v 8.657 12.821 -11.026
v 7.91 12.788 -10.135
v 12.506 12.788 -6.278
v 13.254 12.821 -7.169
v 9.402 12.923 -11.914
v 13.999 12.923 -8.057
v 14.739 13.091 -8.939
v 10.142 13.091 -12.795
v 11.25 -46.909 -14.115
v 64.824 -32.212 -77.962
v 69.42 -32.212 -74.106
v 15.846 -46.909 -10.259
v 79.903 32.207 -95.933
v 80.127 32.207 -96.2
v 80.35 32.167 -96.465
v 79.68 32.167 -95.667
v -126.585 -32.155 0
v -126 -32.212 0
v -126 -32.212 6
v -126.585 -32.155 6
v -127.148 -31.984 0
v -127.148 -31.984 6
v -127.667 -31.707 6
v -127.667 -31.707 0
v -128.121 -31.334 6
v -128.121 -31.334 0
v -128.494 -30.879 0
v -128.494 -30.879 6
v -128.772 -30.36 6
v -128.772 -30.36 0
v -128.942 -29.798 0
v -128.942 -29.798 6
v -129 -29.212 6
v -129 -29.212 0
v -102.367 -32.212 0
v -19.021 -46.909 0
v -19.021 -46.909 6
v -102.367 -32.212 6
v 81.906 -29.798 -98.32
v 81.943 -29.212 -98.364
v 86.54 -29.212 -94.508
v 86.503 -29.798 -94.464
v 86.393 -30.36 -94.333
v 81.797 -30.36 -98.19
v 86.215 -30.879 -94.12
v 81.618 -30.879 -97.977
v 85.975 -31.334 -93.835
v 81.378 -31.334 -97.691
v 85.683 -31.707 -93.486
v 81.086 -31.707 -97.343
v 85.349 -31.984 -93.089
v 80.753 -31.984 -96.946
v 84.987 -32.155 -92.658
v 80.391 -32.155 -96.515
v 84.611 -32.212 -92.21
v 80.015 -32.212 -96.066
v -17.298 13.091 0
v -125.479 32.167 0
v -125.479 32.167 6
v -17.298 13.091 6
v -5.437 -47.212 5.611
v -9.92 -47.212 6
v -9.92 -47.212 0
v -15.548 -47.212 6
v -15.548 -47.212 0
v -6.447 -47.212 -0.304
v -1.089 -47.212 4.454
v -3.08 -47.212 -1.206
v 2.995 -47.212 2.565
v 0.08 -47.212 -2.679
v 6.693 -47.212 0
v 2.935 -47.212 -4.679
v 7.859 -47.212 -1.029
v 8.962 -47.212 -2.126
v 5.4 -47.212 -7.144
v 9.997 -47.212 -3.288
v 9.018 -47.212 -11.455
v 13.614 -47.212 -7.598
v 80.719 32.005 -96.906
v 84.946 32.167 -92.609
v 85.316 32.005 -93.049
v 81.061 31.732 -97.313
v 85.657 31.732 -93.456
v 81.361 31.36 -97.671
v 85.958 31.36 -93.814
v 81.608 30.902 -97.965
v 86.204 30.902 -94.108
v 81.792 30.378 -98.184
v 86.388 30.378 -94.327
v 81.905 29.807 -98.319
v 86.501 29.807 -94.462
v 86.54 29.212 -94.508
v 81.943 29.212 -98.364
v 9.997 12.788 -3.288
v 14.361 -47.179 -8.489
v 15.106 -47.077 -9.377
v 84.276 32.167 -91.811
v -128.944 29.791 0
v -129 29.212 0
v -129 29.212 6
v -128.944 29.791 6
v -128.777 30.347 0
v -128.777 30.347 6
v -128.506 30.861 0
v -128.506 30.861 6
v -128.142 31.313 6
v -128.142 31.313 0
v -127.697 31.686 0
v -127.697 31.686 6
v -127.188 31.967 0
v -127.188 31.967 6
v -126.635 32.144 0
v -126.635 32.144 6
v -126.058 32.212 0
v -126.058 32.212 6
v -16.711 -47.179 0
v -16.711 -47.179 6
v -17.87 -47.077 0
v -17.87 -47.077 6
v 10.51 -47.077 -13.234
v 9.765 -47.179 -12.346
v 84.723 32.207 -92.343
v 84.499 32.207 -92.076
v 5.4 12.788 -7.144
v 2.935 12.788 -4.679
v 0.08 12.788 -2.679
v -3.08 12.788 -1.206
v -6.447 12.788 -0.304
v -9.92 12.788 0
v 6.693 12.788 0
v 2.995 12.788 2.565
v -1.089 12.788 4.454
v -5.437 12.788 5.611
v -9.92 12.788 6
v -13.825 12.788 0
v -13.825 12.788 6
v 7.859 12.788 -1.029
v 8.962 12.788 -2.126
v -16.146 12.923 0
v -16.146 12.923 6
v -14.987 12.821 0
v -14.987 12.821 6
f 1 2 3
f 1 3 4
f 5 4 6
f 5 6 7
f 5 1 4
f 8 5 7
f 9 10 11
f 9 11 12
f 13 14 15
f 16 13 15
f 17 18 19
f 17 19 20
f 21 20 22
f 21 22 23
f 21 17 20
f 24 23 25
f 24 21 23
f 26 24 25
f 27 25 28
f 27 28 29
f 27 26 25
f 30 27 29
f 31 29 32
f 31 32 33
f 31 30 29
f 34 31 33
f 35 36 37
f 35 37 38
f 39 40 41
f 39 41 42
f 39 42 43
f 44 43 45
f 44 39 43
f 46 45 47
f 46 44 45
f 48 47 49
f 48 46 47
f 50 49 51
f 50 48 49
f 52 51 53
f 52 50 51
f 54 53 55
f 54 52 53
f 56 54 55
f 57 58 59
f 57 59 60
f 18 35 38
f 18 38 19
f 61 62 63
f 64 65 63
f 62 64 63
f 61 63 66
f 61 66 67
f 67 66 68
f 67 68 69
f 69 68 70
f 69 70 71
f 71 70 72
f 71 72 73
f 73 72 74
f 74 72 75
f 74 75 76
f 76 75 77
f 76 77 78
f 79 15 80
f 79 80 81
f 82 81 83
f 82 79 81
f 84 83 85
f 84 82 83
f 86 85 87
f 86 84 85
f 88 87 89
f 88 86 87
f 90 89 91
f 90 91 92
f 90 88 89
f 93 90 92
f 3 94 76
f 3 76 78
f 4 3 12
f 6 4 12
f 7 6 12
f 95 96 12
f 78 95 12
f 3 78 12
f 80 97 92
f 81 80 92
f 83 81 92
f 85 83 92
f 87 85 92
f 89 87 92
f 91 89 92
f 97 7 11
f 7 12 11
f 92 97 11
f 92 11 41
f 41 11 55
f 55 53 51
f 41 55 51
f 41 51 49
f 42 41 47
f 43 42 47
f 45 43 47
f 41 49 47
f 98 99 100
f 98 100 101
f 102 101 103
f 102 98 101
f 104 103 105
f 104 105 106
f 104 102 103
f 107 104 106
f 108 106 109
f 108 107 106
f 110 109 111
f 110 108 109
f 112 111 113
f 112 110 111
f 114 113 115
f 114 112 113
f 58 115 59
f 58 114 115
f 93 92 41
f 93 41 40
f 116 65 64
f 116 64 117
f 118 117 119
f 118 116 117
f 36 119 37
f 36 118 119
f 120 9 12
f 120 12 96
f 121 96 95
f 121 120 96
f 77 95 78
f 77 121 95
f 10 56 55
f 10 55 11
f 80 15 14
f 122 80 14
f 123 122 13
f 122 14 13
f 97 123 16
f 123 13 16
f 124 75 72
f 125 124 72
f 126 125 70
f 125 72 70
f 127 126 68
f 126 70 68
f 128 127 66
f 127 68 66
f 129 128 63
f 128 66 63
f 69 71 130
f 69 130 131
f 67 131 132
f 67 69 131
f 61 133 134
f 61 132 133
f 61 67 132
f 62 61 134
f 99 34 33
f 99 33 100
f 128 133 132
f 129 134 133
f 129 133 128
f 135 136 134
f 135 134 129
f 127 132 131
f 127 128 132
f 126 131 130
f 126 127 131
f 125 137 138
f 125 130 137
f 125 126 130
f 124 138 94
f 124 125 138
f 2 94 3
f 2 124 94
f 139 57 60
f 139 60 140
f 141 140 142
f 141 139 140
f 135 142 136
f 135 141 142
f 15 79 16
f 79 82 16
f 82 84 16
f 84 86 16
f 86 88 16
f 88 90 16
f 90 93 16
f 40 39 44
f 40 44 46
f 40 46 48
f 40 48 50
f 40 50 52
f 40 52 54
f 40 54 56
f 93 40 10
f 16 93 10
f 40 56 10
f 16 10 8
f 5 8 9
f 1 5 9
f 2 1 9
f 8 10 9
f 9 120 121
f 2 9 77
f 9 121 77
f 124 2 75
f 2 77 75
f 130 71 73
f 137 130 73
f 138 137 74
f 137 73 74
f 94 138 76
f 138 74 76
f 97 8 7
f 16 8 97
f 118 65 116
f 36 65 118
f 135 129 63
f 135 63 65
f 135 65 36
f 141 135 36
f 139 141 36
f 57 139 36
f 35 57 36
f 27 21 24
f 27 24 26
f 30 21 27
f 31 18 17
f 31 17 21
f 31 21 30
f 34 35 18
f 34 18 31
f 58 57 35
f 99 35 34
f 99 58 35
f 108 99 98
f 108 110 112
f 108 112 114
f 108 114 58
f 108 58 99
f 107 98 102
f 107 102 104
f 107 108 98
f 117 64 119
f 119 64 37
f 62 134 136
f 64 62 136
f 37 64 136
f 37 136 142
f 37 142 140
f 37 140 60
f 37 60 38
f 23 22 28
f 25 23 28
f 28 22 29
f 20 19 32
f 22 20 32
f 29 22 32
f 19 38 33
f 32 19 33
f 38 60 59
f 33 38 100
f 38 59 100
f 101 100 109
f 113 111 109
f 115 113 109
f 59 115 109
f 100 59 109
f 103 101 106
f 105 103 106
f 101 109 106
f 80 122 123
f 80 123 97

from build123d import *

# Parameters (mm, degrees)
BASE_EXTRUDE_DEPTH     = 6
PROCESS_BENDS1_START   = -47.212369611
PROCESS_BENDS1_DEPTH   = 79.424739222
PROCESS_BENDS1_START_2 = -29.212369611
PROCESS_BENDS1_2_DEPTH = 42
PROCESS_BENDS1_3_DEPTH = 79.379162481
PROCESS_BENDS1_START_3 = -7.599506721
PROCESS_BENDS1_4_DEPTH = 13.144247807
PROCESS_BENDS1_START_4 = -0.455258914
PROCESS_BENDS1_5_DEPTH = 6


with BuildPart() as part:
    # Sketch1 → Base-Extrude (new body)
    with BuildSketch(Plane.XY):
        with BuildLine():
            Line((-125.479055467, 32.16679287), (-17.29755389, 13.091475329))
            ThreePointArc((-17.29755389, 13.091475329), (-15.567705192, 12.863736427), (-13.824590337, 12.787630389))
            Line((-13.824590337, 12.787630389), (13.824590337, 12.787630389))
            ThreePointArc((13.824590337, 12.787630389), (15.567705192, 12.863736427), (17.29755389, 13.091475329))
            Line((17.29755389, 13.091475329), (125.479055467, 32.16679287))
            ThreePointArc((125.479055467, 32.16679287), (127.928362829, 31.51050294), (129, 29.212369611))
            Line((129, 29.212369611), (129, -29.212369611))
            ThreePointArc((129, -29.212369611), (128.121320344, -31.333689955), (126, -32.212369611))
            Line((126, -32.212369611), (102.366781185, -32.212369611))
            Line((102.366781185, -32.212369611), (19.020744173, -46.908524671))
            ThreePointArc((19.020744173, -46.908524671), (17.290895475, -47.136263573), (15.54778062, -47.212369611))
            Line((15.54778062, -47.212369611), (-15.54778062, -47.212369611))
            ThreePointArc((-15.54778062, -47.212369611), (-17.290895475, -47.136263573), (-19.020744173, -46.908524671))
            Line((-19.020744173, -46.908524671), (-102.366781185, -32.212369611))
            Line((-102.366781185, -32.212369611), (-126, -32.212369611))
            ThreePointArc((-126, -32.212369611), (-128.121320344, -31.333689955), (-129, -29.212369611))
            Line((-129, -29.212369611), (-129, 29.212369611))
            ThreePointArc((-129, 29.212369611), (-127.928362829, 31.51050294), (-125.479055467, 32.16679287))
        make_face()
    extrude(amount=BASE_EXTRUDE_DEPTH)

    # Process-Bends1: read off the stored shape, not the designer's step
    # Process-Bends1 outline → Process-Bends1 (cut)
    with BuildSketch(Plane(origin=(0, 0, 0), x_dir=(1, 0, 0), z_dir=(0, 1, 0)).offset(PROCESS_BENDS1_START)):
        with BuildLine():
            Line((129, 0), (6.692796258, 0))
            ThreePointArc((6.692796258, 0), (-1.088690602, -4.454038521), (-9.920451468, -6))
            Line((-9.920451468, -6), (129, -6))
            Line((129, -6), (129, 0))
        make_face()
    extrude(amount=PROCESS_BENDS1_DEPTH, mode=Mode.SUBTRACT)

    # Process-Bends1 2 outline → Process-Bends1 2 (add)
    with BuildSketch(Plane(origin=(0, 0, 0), x_dir=(1, 0, 0), z_dir=(0, 1, 0)).offset(PROCESS_BENDS1_START_2)):
        with BuildLine():
            ThreePointArc((6.692796258, 0), (8.418565431, 1.569577889), (9.996704053, 3.287522148))
            Line((9.996704053, 3.287522148), (86.539562416, 94.50774859))
            Line((86.539562416, 94.50774859), (81.943295757, 98.364474248))
            Line((81.943295757, 98.364474248), (5.400437394, 7.144247806))
            ThreePointArc((5.400437394, 7.144247806), (-1.468086233, 1.873844259), (-9.920451468, 0))
            Line((-9.920451468, 0), (6.692796258, 0))
        make_face()
    extrude(amount=PROCESS_BENDS1_2_DEPTH)

    # Process-Bends1 3 outline → Process-Bends1 3 (add)
    with BuildSketch(Plane(origin=(0, 0, 0), x_dir=(1, 0, 0), z_dir=(0, 1, 0)).offset(PROCESS_BENDS1_START)):
        with BuildLine():
            ThreePointArc((6.692796258, 0), (8.418565431, 1.569577889), (9.996704053, 3.287522148))
            Line((9.996704053, 3.287522148), (86.539562416, 94.50774859))
            Line((86.539562416, 94.50774859), (81.943295757, 98.364474248))
            Line((81.943295757, 98.364474248), (5.400437394, 7.144247806))
            ThreePointArc((5.400437394, 7.144247806), (-1.468086233, 1.873844259), (-9.920451468, 0))
            Line((-9.920451468, 0), (6.692796258, 0))
        make_face()
    extrude(amount=PROCESS_BENDS1_3_DEPTH)

    # Process-Bends1 4 outline → Process-Bends1 4 (cut)
    with BuildSketch(Plane(origin=(0, 0, 0), x_dir=(0.6427876096865379, 0, -0.7660444431189791), z_dir=(0.7660444431189791, 0, 0.6427876096865381)).offset(PROCESS_BENDS1_START_3)):
        with BuildLine():
            Line((-8, 12.787630389), (12.848284445, 12.787630389))
            ThreePointArc((12.848284445, 12.787630389), (14.5913993, 12.863736427), (16.321247998, 13.091475329))
            Line((16.321247998, 13.091475329), (124.502749575, 32.16679287))
            Line((124.502749575, 32.16679287), (-8, 32.16679287))
            Line((-8, 32.16679287), (-8, 12.787630389))
        make_face()
        with BuildLine():
            Line((128.023694108, 32.16679287), (125.54463864, 32.16679287))
            ThreePointArc((125.54463864, 32.16679287), (127.321827437, 31.14073244), (128.023694108, 29.212369611))
            Line((128.023694108, 29.212369611), (128.023694108, 32.16679287))
        make_face()
        with BuildLine():
            ThreePointArc((18.044438281, -46.908524671), (16.314589583, -47.136263573), (14.571474728, -47.212369611))
            Line((14.571474728, -47.212369611), (128.023694108, -47.212369611))
            Line((128.023694108, -47.212369611), (128.023694108, -29.212369611))
            ThreePointArc((128.023694108, -29.212369611), (127.145014451, -31.333689954), (125.023694108, -32.212369611))
            Line((125.023694108, -32.212369611), (101.390475292, -32.212369611))
            Line((101.390475292, -32.212369611), (18.044438281, -46.908524671))
        make_face()
    extrude(amount=PROCESS_BENDS1_4_DEPTH, mode=Mode.SUBTRACT)

    # Process-Bends1 5 outline → Process-Bends1 5 (add)
    with BuildSketch(Plane(origin=(0, 0, 0), x_dir=(0.6427876096865379, 0, -0.7660444431189791), z_dir=(0.7660444431189791, 0, 0.6427876096865381)).offset(PROCESS_BENDS1_START_4)):
        with BuildLine():
            ThreePointArc((125.54463864, 32.16679287), (125.023694107, 32.212369611), (124.502749575, 32.16679287))
            Line((124.502749575, 32.16679287), (125.54463864, 32.16679287))
        make_face()
    extrude(amount=PROCESS_BENDS1_5_DEPTH)


solid = part.part
